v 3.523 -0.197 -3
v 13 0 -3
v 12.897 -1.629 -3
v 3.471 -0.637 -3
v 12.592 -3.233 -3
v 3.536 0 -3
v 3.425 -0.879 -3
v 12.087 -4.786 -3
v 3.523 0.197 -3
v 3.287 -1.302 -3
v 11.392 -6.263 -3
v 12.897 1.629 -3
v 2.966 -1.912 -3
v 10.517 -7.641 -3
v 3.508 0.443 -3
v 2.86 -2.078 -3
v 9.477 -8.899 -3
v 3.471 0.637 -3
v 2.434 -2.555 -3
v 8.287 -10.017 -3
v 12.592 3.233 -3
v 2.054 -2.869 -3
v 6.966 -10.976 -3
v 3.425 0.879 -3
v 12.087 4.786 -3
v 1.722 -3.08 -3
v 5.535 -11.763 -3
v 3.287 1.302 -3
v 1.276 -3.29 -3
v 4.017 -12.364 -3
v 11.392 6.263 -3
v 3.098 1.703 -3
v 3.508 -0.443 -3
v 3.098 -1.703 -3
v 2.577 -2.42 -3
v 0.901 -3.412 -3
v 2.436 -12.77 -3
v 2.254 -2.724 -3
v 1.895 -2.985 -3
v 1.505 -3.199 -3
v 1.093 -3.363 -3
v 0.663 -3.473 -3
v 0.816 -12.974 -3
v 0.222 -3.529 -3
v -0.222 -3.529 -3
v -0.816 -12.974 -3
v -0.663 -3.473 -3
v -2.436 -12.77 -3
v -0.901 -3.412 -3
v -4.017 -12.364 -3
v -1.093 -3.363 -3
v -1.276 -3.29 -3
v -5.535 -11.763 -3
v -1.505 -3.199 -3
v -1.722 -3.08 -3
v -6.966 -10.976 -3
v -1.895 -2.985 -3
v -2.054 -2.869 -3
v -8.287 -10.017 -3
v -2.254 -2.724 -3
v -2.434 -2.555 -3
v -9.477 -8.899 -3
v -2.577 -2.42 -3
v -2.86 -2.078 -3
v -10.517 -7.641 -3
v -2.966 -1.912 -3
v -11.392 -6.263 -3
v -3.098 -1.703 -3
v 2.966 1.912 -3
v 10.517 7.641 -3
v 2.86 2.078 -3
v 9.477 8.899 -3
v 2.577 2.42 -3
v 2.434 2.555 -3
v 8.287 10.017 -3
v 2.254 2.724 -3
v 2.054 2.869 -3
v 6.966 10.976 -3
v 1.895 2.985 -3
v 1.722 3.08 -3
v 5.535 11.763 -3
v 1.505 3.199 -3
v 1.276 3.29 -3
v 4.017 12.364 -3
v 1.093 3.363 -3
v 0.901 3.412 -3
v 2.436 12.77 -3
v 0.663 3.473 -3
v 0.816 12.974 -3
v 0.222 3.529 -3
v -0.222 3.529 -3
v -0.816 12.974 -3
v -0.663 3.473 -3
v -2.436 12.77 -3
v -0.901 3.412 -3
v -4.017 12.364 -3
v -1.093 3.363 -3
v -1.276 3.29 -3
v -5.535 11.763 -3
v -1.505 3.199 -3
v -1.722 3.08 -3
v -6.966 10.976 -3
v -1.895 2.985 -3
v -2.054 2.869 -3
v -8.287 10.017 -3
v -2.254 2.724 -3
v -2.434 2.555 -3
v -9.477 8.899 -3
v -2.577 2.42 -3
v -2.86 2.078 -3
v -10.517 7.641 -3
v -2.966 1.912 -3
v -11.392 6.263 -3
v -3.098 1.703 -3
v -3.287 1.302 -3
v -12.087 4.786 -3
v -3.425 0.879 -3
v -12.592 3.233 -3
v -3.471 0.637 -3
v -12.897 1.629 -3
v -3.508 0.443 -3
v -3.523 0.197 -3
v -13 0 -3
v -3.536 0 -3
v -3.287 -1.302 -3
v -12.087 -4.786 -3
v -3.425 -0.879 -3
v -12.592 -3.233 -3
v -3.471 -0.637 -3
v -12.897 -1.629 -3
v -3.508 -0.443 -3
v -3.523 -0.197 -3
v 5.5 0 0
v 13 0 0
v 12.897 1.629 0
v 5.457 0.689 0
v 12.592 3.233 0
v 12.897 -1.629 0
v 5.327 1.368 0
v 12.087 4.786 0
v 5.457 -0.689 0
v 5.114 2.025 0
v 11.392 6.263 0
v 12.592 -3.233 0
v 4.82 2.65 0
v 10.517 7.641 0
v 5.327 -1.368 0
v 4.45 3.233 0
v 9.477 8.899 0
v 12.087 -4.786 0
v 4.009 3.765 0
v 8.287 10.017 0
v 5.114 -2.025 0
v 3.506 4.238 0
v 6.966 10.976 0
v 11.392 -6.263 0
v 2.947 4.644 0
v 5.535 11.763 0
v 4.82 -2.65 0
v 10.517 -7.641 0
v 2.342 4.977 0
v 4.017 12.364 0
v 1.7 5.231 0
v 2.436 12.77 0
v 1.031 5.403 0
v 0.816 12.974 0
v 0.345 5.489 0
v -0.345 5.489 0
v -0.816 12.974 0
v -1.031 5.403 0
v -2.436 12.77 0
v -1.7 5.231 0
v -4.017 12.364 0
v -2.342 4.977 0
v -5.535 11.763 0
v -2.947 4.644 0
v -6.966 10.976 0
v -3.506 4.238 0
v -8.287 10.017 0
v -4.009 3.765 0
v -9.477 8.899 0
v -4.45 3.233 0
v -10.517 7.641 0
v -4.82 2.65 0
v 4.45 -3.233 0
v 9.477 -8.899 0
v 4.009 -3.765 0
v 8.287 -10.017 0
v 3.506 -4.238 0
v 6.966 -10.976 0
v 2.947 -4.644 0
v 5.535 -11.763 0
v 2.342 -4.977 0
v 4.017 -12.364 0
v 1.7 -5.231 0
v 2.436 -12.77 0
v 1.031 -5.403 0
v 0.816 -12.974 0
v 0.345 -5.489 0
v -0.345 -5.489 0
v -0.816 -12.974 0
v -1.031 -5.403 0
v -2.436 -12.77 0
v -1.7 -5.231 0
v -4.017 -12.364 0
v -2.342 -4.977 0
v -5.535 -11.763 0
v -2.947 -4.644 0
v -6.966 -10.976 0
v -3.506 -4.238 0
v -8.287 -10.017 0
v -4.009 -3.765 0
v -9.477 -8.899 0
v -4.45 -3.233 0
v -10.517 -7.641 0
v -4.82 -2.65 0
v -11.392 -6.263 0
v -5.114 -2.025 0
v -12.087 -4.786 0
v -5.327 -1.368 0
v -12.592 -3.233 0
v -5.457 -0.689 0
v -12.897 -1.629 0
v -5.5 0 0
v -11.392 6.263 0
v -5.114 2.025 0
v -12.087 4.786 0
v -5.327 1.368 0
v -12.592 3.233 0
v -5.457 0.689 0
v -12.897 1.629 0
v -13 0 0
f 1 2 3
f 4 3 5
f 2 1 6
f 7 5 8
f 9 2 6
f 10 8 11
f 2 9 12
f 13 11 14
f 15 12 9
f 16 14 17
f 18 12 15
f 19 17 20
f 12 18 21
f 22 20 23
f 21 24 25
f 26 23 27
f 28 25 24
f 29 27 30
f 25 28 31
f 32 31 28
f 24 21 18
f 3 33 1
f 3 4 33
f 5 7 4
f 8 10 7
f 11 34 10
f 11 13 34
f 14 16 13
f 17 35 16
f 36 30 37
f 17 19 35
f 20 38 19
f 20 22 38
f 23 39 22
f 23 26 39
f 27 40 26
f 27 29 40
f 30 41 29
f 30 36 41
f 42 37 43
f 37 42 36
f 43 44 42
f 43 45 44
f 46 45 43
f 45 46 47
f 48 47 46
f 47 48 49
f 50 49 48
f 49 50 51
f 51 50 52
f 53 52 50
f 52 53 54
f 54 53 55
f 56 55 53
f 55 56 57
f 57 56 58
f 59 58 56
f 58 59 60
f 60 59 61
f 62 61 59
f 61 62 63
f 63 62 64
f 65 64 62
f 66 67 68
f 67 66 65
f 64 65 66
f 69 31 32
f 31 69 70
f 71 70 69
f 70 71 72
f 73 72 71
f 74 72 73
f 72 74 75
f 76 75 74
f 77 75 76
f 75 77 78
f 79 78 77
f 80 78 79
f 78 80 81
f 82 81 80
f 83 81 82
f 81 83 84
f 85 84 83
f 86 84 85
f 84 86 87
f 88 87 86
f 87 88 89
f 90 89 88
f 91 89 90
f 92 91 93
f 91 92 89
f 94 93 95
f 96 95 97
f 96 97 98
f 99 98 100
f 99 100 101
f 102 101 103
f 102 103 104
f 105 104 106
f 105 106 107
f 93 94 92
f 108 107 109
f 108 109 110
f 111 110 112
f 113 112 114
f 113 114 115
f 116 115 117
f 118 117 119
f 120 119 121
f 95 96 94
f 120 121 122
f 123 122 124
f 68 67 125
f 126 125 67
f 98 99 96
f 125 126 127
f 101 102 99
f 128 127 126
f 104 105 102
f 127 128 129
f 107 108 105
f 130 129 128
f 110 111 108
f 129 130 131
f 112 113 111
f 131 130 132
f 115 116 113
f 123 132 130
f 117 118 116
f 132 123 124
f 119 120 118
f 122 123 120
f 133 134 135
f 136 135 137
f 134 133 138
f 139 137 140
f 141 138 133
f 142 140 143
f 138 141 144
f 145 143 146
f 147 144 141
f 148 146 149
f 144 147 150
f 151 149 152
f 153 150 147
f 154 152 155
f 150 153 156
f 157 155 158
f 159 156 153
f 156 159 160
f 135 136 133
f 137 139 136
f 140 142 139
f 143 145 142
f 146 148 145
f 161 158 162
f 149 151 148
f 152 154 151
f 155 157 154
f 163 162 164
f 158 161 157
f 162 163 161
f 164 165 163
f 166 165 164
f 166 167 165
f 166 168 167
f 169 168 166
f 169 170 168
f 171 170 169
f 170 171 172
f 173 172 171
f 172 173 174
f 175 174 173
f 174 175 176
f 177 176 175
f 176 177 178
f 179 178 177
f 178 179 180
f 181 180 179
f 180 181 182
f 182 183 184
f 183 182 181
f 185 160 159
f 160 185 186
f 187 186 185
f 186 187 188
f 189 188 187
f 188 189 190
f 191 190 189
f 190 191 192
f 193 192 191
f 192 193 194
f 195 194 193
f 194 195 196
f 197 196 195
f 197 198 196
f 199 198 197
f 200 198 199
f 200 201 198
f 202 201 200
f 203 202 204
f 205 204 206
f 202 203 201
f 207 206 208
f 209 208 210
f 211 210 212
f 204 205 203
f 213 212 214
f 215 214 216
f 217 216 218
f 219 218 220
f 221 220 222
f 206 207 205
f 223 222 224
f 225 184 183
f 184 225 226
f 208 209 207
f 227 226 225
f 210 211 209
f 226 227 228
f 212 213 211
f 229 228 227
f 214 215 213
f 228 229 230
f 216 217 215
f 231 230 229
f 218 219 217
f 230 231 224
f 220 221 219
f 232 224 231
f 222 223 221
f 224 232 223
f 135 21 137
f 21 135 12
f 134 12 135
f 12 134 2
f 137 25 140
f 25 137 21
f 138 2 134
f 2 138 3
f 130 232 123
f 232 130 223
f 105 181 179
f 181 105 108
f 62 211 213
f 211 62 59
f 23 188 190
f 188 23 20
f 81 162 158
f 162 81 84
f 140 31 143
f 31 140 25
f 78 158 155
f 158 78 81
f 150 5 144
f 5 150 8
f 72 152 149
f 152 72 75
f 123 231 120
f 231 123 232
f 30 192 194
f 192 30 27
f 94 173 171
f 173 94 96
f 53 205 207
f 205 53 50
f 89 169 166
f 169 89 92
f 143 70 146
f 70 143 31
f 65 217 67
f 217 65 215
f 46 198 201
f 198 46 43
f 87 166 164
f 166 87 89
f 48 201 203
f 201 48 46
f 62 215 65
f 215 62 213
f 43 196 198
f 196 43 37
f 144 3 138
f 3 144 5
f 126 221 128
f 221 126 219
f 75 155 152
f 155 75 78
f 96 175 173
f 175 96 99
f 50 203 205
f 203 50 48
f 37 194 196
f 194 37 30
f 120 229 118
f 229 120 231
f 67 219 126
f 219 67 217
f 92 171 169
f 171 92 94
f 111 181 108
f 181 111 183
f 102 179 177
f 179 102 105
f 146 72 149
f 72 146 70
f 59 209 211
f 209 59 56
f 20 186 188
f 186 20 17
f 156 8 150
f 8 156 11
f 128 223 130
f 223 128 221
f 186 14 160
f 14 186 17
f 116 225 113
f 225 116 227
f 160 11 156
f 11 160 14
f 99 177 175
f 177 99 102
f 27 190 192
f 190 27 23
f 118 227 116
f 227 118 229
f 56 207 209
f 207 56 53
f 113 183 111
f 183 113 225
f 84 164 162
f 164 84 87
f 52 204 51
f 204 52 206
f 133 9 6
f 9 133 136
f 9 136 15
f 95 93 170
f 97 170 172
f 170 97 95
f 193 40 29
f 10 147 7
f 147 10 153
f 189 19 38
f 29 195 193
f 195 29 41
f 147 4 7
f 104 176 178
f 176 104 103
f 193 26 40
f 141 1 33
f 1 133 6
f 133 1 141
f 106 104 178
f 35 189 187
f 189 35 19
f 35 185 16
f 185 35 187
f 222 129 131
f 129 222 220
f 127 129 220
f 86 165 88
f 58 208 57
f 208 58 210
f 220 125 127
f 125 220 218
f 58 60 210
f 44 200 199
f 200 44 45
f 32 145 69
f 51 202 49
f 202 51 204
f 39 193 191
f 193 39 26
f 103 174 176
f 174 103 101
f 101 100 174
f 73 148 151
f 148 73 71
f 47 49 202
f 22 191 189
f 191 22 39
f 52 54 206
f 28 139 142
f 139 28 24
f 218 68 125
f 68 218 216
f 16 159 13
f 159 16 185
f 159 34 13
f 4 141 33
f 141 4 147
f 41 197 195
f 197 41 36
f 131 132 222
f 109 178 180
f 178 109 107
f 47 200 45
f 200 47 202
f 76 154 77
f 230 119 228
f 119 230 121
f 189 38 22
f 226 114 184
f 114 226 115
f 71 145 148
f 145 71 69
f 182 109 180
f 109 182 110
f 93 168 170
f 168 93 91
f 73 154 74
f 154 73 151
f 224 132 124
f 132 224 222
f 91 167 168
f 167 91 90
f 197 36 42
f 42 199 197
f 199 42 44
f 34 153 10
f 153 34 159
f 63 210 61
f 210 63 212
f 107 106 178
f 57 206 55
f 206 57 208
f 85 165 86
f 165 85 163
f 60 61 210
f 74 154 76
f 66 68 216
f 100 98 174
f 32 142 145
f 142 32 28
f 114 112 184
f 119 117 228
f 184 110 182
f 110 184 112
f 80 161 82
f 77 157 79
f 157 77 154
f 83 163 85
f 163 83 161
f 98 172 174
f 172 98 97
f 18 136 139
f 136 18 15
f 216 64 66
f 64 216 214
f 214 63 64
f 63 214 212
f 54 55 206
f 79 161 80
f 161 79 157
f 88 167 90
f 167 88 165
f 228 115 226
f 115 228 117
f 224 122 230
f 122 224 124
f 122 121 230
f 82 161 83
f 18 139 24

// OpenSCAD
$fn = 50;


difference() {
	union() {
		translate(v = [0, 0, -3.0000000000]) {
			cylinder(h = 3, r = 10.0000000000);
		}
		translate(v = [0, 0, -3.0000000000]) {
			cylinder(h = 3, r = 13.0000000000);
		}
	}
	union() {
		translate(v = [0, 0, 0]) {
			rotate(a = [0, 0, 0]) {
				difference() {
					union() {
						#translate(v = [0, 0, -3.0000000000]) {
							cylinder(h = 3, r = 2.2500000000);
						}
						#translate(v = [0, 0, -4.2000000000]) {
							cylinder(h = 4.2000000000, r = 10.0000000000, r1 = 2.7500000000, r2 = 5.5000000000);
						}
						#translate(v = [0, 0, -3.0000000000]) {
							cylinder(h = 3, r = 2.7500000000);
						}
						#translate(v = [0, 0, -3.0000000000]) {
							cylinder(h = 3, r = 2.2500000000);
						}
					}
					union();
				}
			}
		}
	}
}
